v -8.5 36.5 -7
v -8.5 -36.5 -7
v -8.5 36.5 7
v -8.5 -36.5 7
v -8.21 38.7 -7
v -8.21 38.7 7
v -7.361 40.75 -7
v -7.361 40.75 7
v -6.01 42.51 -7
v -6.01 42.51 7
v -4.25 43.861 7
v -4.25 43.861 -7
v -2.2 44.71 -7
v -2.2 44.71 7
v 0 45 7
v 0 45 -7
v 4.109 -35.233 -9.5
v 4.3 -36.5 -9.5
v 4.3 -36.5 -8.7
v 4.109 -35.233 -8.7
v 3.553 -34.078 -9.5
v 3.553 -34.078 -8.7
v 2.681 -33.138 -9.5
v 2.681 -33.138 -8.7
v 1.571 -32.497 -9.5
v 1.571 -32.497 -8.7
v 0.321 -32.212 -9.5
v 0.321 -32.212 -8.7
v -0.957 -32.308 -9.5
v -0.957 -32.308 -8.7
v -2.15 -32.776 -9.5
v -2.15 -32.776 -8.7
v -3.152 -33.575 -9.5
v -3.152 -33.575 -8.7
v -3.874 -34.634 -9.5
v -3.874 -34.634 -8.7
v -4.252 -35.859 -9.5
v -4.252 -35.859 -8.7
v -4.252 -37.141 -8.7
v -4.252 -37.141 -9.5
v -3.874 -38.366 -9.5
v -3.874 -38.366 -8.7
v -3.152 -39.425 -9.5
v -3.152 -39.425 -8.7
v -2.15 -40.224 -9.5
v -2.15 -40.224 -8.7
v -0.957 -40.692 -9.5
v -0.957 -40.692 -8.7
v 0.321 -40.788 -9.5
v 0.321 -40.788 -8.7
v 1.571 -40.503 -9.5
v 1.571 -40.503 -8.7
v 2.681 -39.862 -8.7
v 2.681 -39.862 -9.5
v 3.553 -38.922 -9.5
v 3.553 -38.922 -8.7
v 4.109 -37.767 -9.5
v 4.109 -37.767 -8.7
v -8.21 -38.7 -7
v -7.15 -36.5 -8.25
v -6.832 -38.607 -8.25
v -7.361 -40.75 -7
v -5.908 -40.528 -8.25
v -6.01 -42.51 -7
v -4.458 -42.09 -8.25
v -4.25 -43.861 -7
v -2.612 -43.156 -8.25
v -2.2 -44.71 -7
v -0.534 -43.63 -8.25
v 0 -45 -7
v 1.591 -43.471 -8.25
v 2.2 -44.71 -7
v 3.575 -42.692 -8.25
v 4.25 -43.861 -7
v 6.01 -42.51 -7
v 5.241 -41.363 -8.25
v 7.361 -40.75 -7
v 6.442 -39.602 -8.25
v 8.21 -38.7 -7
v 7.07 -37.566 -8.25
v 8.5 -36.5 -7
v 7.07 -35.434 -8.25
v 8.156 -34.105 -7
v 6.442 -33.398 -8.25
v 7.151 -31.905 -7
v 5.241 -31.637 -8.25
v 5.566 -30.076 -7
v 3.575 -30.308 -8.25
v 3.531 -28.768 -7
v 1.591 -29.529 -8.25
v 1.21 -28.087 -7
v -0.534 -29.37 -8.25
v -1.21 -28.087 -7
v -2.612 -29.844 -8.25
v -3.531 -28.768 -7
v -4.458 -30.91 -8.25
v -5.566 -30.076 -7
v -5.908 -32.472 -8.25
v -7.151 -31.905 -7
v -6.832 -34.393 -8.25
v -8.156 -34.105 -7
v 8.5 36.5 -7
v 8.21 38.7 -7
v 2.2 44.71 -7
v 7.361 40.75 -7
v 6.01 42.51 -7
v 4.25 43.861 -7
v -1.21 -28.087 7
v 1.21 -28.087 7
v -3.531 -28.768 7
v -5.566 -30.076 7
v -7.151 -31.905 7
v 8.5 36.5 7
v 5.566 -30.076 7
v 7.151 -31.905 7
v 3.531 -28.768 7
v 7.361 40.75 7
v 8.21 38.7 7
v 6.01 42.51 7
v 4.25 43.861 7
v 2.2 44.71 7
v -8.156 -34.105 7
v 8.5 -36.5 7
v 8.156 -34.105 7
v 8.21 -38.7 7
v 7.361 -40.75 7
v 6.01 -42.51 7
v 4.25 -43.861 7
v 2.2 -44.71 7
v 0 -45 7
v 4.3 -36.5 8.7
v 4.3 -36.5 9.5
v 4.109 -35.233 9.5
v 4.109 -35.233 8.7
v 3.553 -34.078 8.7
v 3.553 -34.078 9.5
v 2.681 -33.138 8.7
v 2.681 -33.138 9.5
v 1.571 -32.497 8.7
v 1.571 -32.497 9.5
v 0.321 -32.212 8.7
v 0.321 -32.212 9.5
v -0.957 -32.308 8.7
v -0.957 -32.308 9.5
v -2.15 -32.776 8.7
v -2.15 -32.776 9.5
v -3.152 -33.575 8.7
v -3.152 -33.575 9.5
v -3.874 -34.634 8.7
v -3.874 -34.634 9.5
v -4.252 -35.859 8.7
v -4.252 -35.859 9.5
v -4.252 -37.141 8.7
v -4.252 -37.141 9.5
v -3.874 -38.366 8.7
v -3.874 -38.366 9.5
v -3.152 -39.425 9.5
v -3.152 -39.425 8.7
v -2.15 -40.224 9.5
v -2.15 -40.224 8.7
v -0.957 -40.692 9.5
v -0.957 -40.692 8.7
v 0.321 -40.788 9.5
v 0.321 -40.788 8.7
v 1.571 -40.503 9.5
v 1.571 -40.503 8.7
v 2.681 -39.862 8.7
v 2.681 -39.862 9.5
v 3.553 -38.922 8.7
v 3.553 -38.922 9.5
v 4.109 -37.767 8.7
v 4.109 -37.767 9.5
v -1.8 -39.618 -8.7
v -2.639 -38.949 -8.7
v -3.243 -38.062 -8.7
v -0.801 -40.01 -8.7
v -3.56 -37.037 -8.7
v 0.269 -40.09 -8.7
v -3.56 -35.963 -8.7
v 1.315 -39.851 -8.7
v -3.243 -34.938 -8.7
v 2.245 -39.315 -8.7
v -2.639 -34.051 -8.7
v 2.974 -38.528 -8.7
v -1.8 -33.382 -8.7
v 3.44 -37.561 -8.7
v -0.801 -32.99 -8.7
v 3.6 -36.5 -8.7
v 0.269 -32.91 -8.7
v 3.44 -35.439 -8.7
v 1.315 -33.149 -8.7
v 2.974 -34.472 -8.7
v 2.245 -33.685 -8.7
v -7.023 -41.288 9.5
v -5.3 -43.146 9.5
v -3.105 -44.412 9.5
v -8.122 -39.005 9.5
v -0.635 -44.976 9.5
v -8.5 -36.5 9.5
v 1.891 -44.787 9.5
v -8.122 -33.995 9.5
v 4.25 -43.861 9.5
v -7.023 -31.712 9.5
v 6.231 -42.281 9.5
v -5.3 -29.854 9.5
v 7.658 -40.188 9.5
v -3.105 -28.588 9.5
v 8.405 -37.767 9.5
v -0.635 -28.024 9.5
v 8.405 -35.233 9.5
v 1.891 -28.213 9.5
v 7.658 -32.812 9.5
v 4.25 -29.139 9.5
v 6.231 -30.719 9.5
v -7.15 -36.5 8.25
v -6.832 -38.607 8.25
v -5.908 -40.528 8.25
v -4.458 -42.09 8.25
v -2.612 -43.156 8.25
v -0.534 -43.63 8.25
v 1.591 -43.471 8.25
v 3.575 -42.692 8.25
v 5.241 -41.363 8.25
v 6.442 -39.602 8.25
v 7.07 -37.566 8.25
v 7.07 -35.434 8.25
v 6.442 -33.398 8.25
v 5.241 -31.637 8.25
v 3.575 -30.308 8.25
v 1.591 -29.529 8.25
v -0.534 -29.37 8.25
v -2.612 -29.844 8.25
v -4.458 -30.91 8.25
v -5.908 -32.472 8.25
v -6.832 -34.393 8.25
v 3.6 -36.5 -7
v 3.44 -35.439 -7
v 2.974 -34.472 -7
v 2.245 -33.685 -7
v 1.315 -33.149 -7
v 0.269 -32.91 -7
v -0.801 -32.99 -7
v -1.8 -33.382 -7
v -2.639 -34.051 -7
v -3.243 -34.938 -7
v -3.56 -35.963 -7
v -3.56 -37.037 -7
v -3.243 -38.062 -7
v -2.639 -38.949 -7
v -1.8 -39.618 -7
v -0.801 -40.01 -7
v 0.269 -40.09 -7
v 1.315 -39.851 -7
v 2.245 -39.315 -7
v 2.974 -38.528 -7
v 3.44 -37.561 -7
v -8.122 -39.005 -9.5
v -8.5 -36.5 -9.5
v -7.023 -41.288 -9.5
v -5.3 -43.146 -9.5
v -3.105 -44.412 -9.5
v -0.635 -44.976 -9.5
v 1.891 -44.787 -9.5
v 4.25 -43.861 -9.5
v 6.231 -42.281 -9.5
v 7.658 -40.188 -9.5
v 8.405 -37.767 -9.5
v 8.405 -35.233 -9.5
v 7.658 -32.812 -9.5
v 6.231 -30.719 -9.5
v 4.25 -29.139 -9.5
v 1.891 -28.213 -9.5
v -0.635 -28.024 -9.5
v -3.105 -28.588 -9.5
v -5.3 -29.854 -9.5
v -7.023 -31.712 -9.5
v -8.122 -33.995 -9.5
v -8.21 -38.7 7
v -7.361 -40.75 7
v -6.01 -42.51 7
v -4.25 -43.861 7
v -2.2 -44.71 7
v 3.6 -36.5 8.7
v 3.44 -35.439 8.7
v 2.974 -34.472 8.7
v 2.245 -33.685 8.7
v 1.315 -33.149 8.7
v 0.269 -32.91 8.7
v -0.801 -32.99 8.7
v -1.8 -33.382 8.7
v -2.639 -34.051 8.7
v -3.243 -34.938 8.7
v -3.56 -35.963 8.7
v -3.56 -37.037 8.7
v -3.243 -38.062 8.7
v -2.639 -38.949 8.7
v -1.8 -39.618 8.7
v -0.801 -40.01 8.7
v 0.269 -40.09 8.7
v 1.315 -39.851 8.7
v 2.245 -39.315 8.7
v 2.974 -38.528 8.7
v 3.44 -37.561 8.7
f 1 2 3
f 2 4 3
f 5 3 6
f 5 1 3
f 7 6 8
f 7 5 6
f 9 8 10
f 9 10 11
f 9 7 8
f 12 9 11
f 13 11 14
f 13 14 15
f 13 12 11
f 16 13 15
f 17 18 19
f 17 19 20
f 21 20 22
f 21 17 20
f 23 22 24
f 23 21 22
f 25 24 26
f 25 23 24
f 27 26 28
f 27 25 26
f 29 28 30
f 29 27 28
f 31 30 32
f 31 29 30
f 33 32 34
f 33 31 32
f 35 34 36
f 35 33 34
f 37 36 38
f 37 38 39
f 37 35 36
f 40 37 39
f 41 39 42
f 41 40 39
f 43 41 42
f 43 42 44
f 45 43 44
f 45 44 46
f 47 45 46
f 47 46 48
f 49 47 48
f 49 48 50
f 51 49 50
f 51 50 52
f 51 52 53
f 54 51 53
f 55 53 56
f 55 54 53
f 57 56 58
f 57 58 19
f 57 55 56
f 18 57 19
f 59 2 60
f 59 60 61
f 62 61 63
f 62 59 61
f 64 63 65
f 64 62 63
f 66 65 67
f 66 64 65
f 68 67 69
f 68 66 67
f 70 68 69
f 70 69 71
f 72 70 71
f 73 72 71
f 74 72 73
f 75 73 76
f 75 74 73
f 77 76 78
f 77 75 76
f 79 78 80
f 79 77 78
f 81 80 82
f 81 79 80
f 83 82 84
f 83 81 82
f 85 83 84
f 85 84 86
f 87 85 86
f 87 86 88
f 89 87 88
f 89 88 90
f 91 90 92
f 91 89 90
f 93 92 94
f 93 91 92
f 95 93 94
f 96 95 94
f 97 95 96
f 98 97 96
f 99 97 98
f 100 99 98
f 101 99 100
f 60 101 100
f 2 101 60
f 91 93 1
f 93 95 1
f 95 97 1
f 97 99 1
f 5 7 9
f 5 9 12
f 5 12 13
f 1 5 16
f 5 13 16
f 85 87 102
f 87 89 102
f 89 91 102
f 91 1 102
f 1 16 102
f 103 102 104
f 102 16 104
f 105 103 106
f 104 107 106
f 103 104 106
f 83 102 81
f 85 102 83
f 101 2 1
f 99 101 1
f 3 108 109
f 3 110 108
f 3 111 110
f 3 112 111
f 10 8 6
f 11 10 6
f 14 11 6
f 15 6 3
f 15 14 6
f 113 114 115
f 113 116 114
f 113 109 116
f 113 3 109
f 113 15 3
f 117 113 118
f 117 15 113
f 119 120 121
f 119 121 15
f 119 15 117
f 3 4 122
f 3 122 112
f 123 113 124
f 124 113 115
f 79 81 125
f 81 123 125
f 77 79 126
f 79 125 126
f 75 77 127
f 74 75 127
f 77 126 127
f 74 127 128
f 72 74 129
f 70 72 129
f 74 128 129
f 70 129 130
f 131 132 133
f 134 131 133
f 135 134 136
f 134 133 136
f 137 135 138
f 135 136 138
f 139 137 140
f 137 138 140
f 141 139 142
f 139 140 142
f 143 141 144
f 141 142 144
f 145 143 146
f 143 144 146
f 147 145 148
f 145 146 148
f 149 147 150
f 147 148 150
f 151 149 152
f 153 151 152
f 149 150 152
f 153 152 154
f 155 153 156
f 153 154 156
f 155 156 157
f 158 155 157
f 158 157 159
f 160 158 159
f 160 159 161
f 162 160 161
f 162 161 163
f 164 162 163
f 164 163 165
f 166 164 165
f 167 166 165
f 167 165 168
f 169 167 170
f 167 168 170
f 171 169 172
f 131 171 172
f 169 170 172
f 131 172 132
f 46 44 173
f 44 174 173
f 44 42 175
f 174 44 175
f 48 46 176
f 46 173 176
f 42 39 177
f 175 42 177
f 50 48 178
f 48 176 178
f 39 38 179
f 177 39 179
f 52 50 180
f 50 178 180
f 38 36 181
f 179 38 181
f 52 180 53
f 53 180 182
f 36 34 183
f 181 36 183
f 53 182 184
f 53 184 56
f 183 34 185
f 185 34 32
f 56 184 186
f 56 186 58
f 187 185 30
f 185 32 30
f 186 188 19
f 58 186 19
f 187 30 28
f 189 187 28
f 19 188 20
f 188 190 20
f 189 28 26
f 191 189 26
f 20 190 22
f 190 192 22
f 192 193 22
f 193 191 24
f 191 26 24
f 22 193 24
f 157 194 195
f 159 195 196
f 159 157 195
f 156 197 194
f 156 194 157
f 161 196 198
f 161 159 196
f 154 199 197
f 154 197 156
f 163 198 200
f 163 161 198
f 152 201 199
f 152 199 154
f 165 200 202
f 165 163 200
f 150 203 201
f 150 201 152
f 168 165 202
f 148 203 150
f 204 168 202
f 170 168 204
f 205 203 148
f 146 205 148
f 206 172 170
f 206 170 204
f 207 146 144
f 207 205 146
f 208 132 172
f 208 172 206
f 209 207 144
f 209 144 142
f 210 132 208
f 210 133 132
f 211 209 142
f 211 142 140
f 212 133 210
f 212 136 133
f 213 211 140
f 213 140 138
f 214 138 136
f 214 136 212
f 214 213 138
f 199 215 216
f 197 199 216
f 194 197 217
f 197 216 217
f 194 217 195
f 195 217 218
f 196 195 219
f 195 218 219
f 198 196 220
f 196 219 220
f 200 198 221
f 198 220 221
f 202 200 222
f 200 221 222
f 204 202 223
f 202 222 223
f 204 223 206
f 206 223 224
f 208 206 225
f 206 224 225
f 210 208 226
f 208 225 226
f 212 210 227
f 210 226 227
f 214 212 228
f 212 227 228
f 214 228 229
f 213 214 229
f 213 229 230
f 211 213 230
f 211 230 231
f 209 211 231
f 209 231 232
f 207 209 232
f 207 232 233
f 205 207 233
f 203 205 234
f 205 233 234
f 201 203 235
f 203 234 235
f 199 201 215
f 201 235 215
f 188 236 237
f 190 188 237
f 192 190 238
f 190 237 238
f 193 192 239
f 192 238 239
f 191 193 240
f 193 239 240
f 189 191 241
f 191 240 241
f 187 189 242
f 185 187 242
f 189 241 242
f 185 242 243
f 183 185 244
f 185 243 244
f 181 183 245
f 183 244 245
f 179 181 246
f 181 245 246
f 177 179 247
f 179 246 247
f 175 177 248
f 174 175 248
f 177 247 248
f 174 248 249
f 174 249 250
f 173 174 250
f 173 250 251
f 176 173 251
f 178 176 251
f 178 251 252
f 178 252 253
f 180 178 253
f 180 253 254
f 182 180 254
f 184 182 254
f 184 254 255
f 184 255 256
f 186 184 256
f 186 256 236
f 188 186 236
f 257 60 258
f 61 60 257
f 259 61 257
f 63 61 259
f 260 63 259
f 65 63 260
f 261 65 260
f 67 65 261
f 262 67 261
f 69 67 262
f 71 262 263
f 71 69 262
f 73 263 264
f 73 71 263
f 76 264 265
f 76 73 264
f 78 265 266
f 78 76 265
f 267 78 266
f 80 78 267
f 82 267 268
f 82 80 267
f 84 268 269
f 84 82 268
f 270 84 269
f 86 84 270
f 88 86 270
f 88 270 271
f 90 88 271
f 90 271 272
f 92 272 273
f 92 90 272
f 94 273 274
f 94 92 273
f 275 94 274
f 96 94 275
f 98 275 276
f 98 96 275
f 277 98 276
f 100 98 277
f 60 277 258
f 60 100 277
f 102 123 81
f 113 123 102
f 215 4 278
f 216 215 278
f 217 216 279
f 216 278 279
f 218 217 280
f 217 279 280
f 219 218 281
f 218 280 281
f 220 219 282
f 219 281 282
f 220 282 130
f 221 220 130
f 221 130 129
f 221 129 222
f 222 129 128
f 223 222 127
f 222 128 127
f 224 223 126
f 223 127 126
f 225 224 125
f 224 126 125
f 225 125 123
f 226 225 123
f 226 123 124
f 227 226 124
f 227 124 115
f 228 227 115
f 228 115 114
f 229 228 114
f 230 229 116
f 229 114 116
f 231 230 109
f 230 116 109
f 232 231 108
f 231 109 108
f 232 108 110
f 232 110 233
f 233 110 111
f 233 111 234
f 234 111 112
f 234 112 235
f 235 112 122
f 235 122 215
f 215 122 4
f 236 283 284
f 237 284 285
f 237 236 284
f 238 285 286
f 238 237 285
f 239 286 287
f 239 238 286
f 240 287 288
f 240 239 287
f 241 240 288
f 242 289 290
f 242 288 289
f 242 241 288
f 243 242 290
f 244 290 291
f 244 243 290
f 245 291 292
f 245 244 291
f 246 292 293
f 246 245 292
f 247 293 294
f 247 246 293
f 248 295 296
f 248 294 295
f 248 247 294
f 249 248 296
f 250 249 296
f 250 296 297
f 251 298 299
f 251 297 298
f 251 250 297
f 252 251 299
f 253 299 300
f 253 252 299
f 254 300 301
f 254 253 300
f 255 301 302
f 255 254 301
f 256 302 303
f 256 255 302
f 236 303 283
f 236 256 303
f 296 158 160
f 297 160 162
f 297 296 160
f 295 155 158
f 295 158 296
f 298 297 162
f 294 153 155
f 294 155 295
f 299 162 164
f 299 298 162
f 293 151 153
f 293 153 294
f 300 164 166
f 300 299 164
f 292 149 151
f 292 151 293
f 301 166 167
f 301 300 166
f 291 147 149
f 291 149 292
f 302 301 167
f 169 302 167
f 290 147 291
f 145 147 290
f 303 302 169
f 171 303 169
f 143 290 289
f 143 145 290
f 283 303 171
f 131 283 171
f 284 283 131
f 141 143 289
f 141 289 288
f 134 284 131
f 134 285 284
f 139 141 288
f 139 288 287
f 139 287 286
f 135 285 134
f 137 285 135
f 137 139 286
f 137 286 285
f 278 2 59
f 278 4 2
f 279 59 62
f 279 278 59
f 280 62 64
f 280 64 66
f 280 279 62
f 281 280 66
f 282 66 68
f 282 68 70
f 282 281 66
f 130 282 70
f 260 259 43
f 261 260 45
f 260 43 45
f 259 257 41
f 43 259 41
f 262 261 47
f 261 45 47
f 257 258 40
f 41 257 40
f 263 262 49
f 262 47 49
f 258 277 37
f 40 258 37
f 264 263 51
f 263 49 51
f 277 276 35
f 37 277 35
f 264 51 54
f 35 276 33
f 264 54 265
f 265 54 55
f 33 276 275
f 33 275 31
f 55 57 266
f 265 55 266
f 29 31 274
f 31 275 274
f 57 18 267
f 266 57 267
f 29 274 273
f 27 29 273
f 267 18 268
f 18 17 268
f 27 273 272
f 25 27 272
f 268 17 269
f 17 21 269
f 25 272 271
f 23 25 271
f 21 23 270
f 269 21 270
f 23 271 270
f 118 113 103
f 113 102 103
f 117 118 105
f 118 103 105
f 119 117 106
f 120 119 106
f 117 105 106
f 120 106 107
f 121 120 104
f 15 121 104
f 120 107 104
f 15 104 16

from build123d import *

# Parameters (mm, degrees)
SKETCH_1_W          = 17
SKETCH_1_H          = 90
SKETCH_1_R          = 3.6
EXTRUDE_1_DEPTH     = 7
FILLET_1_R          = 8.5
SKETCH_2_R          = 8.5
SKETCH_2_R_2        = 3.6
EXTRUDE_2_DEPTH     = 2.5
SKETCH_4_R          = 4.3
CUT_EXTRUDE_1_DEPTH = 0.8


with BuildPart() as part:
    # 스케치1 → 보스-돌출1 (new, symmetric)
    with BuildSketch(Plane.XY):
        Rectangle(SKETCH_1_W, SKETCH_1_H)
        with Locations((0, -36.5)):
            Circle(SKETCH_1_R, mode=Mode.SUBTRACT)
    extrude(amount=EXTRUDE_1_DEPTH, both=True)

    # 필렛1
    fillet_1_edges = [part.edges().sort_by_distance(p)[0] for p in [
        (8.5, -45, 0),
        (-8.5, -45, 0),
        (-8.5, 45, 0),
        (8.5, 45, 0),
    ]]
    fillet(fillet_1_edges, radius=FILLET_1_R - 0.0001)  # a hair under: the kernel refuses the full size

    # 스케치2 → 보스-돌출2 (add)
    with BuildSketch(Plane.XY.offset(7)):
        with Locations((0, -36.5)):
            Circle(SKETCH_2_R)
        with Locations((0, -36.5)):
            Circle(SKETCH_2_R_2, mode=Mode.SUBTRACT)
    extrude_2 = extrude(amount=EXTRUDE_2_DEPTH)

    # 스케치3 → 컷-회전1 (revolve, cut)
    with BuildSketch(Plane(origin=(0, 0, 0), x_dir=(0, 0, -1), z_dir=(1, 0, 0)), mode=Mode.PRIVATE) as cut_revolve_1_sk:
        Polygon((-9.5, -28), (-8.25, -29.35), (-7, -28), align=None)
    cut_revolve_1 = revolve(cut_revolve_1_sk.sketch.rotate(Axis((0, -36.5, 0), (0, 0, 1)), 90), axis=Axis((0, -36.5, 0), (0, 0, 1)), mode=Mode.SUBTRACT)

    # 스케치4 → 컷-돌출1 (cut)
    with BuildSketch(Plane.XY.offset(9.5)):
        with Locations((0, -36.5)):
            Circle(SKETCH_4_R)
    cut_extrude_1 = extrude(amount=-CUT_EXTRUDE_1_DEPTH, mode=Mode.SUBTRACT)

    # 대칭 복사1: 보스-돌출2, 컷-회전1, 컷-돌출1 across plane
    add(extrude_2.mirror(Plane.XY))
    add(cut_revolve_1.mirror(Plane.XY), mode=Mode.SUBTRACT)
    add(cut_extrude_1.mirror(Plane.XY), mode=Mode.SUBTRACT)


solid = part.part
